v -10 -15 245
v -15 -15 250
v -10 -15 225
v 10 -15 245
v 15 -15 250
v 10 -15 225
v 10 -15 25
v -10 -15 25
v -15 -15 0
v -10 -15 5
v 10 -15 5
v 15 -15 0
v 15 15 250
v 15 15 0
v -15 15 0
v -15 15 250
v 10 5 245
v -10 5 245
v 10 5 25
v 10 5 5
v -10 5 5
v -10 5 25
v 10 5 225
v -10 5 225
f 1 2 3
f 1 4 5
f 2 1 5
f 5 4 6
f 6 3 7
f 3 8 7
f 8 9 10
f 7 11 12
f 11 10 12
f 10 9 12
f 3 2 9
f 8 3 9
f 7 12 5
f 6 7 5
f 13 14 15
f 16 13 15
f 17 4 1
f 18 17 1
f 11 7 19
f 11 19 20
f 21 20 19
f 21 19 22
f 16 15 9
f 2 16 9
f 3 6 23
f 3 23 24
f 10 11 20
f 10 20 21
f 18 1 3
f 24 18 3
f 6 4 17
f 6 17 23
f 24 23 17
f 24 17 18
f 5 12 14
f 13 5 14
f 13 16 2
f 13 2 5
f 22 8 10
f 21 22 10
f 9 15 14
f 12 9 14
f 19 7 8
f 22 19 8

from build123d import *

# Parameters (mm, degrees)
BOSS_EXTRUDE1_DEPTH = 250
SKETCH3_W           = 20
SKETCH3_H           = 20
CUT_EXTRUDE1_DEPTH  = 20


with BuildPart() as part:
    # Sketch1 → Boss-Extrude1 (new body)
    with BuildSketch(Plane.XY):
        Polygon((0, 15), (-15, 15), (-15, -15), (15, -15), (15, 15), align=None)
    extrude(amount=BOSS_EXTRUDE1_DEPTH)

    # Sketch3 → Cut-Extrude1 (cut)
    with BuildSketch(Plane(origin=(0, -15, 0), x_dir=(-1, 0, 0), z_dir=(0, -1, 0))):
        with Locations((0, -235)):
            Rectangle(SKETCH3_W, SKETCH3_H)
        with Locations((0, -15)):
            Rectangle(SKETCH3_W, SKETCH3_H)
    extrude(amount=-CUT_EXTRUDE1_DEPTH, mode=Mode.SUBTRACT)


solid = part.part
